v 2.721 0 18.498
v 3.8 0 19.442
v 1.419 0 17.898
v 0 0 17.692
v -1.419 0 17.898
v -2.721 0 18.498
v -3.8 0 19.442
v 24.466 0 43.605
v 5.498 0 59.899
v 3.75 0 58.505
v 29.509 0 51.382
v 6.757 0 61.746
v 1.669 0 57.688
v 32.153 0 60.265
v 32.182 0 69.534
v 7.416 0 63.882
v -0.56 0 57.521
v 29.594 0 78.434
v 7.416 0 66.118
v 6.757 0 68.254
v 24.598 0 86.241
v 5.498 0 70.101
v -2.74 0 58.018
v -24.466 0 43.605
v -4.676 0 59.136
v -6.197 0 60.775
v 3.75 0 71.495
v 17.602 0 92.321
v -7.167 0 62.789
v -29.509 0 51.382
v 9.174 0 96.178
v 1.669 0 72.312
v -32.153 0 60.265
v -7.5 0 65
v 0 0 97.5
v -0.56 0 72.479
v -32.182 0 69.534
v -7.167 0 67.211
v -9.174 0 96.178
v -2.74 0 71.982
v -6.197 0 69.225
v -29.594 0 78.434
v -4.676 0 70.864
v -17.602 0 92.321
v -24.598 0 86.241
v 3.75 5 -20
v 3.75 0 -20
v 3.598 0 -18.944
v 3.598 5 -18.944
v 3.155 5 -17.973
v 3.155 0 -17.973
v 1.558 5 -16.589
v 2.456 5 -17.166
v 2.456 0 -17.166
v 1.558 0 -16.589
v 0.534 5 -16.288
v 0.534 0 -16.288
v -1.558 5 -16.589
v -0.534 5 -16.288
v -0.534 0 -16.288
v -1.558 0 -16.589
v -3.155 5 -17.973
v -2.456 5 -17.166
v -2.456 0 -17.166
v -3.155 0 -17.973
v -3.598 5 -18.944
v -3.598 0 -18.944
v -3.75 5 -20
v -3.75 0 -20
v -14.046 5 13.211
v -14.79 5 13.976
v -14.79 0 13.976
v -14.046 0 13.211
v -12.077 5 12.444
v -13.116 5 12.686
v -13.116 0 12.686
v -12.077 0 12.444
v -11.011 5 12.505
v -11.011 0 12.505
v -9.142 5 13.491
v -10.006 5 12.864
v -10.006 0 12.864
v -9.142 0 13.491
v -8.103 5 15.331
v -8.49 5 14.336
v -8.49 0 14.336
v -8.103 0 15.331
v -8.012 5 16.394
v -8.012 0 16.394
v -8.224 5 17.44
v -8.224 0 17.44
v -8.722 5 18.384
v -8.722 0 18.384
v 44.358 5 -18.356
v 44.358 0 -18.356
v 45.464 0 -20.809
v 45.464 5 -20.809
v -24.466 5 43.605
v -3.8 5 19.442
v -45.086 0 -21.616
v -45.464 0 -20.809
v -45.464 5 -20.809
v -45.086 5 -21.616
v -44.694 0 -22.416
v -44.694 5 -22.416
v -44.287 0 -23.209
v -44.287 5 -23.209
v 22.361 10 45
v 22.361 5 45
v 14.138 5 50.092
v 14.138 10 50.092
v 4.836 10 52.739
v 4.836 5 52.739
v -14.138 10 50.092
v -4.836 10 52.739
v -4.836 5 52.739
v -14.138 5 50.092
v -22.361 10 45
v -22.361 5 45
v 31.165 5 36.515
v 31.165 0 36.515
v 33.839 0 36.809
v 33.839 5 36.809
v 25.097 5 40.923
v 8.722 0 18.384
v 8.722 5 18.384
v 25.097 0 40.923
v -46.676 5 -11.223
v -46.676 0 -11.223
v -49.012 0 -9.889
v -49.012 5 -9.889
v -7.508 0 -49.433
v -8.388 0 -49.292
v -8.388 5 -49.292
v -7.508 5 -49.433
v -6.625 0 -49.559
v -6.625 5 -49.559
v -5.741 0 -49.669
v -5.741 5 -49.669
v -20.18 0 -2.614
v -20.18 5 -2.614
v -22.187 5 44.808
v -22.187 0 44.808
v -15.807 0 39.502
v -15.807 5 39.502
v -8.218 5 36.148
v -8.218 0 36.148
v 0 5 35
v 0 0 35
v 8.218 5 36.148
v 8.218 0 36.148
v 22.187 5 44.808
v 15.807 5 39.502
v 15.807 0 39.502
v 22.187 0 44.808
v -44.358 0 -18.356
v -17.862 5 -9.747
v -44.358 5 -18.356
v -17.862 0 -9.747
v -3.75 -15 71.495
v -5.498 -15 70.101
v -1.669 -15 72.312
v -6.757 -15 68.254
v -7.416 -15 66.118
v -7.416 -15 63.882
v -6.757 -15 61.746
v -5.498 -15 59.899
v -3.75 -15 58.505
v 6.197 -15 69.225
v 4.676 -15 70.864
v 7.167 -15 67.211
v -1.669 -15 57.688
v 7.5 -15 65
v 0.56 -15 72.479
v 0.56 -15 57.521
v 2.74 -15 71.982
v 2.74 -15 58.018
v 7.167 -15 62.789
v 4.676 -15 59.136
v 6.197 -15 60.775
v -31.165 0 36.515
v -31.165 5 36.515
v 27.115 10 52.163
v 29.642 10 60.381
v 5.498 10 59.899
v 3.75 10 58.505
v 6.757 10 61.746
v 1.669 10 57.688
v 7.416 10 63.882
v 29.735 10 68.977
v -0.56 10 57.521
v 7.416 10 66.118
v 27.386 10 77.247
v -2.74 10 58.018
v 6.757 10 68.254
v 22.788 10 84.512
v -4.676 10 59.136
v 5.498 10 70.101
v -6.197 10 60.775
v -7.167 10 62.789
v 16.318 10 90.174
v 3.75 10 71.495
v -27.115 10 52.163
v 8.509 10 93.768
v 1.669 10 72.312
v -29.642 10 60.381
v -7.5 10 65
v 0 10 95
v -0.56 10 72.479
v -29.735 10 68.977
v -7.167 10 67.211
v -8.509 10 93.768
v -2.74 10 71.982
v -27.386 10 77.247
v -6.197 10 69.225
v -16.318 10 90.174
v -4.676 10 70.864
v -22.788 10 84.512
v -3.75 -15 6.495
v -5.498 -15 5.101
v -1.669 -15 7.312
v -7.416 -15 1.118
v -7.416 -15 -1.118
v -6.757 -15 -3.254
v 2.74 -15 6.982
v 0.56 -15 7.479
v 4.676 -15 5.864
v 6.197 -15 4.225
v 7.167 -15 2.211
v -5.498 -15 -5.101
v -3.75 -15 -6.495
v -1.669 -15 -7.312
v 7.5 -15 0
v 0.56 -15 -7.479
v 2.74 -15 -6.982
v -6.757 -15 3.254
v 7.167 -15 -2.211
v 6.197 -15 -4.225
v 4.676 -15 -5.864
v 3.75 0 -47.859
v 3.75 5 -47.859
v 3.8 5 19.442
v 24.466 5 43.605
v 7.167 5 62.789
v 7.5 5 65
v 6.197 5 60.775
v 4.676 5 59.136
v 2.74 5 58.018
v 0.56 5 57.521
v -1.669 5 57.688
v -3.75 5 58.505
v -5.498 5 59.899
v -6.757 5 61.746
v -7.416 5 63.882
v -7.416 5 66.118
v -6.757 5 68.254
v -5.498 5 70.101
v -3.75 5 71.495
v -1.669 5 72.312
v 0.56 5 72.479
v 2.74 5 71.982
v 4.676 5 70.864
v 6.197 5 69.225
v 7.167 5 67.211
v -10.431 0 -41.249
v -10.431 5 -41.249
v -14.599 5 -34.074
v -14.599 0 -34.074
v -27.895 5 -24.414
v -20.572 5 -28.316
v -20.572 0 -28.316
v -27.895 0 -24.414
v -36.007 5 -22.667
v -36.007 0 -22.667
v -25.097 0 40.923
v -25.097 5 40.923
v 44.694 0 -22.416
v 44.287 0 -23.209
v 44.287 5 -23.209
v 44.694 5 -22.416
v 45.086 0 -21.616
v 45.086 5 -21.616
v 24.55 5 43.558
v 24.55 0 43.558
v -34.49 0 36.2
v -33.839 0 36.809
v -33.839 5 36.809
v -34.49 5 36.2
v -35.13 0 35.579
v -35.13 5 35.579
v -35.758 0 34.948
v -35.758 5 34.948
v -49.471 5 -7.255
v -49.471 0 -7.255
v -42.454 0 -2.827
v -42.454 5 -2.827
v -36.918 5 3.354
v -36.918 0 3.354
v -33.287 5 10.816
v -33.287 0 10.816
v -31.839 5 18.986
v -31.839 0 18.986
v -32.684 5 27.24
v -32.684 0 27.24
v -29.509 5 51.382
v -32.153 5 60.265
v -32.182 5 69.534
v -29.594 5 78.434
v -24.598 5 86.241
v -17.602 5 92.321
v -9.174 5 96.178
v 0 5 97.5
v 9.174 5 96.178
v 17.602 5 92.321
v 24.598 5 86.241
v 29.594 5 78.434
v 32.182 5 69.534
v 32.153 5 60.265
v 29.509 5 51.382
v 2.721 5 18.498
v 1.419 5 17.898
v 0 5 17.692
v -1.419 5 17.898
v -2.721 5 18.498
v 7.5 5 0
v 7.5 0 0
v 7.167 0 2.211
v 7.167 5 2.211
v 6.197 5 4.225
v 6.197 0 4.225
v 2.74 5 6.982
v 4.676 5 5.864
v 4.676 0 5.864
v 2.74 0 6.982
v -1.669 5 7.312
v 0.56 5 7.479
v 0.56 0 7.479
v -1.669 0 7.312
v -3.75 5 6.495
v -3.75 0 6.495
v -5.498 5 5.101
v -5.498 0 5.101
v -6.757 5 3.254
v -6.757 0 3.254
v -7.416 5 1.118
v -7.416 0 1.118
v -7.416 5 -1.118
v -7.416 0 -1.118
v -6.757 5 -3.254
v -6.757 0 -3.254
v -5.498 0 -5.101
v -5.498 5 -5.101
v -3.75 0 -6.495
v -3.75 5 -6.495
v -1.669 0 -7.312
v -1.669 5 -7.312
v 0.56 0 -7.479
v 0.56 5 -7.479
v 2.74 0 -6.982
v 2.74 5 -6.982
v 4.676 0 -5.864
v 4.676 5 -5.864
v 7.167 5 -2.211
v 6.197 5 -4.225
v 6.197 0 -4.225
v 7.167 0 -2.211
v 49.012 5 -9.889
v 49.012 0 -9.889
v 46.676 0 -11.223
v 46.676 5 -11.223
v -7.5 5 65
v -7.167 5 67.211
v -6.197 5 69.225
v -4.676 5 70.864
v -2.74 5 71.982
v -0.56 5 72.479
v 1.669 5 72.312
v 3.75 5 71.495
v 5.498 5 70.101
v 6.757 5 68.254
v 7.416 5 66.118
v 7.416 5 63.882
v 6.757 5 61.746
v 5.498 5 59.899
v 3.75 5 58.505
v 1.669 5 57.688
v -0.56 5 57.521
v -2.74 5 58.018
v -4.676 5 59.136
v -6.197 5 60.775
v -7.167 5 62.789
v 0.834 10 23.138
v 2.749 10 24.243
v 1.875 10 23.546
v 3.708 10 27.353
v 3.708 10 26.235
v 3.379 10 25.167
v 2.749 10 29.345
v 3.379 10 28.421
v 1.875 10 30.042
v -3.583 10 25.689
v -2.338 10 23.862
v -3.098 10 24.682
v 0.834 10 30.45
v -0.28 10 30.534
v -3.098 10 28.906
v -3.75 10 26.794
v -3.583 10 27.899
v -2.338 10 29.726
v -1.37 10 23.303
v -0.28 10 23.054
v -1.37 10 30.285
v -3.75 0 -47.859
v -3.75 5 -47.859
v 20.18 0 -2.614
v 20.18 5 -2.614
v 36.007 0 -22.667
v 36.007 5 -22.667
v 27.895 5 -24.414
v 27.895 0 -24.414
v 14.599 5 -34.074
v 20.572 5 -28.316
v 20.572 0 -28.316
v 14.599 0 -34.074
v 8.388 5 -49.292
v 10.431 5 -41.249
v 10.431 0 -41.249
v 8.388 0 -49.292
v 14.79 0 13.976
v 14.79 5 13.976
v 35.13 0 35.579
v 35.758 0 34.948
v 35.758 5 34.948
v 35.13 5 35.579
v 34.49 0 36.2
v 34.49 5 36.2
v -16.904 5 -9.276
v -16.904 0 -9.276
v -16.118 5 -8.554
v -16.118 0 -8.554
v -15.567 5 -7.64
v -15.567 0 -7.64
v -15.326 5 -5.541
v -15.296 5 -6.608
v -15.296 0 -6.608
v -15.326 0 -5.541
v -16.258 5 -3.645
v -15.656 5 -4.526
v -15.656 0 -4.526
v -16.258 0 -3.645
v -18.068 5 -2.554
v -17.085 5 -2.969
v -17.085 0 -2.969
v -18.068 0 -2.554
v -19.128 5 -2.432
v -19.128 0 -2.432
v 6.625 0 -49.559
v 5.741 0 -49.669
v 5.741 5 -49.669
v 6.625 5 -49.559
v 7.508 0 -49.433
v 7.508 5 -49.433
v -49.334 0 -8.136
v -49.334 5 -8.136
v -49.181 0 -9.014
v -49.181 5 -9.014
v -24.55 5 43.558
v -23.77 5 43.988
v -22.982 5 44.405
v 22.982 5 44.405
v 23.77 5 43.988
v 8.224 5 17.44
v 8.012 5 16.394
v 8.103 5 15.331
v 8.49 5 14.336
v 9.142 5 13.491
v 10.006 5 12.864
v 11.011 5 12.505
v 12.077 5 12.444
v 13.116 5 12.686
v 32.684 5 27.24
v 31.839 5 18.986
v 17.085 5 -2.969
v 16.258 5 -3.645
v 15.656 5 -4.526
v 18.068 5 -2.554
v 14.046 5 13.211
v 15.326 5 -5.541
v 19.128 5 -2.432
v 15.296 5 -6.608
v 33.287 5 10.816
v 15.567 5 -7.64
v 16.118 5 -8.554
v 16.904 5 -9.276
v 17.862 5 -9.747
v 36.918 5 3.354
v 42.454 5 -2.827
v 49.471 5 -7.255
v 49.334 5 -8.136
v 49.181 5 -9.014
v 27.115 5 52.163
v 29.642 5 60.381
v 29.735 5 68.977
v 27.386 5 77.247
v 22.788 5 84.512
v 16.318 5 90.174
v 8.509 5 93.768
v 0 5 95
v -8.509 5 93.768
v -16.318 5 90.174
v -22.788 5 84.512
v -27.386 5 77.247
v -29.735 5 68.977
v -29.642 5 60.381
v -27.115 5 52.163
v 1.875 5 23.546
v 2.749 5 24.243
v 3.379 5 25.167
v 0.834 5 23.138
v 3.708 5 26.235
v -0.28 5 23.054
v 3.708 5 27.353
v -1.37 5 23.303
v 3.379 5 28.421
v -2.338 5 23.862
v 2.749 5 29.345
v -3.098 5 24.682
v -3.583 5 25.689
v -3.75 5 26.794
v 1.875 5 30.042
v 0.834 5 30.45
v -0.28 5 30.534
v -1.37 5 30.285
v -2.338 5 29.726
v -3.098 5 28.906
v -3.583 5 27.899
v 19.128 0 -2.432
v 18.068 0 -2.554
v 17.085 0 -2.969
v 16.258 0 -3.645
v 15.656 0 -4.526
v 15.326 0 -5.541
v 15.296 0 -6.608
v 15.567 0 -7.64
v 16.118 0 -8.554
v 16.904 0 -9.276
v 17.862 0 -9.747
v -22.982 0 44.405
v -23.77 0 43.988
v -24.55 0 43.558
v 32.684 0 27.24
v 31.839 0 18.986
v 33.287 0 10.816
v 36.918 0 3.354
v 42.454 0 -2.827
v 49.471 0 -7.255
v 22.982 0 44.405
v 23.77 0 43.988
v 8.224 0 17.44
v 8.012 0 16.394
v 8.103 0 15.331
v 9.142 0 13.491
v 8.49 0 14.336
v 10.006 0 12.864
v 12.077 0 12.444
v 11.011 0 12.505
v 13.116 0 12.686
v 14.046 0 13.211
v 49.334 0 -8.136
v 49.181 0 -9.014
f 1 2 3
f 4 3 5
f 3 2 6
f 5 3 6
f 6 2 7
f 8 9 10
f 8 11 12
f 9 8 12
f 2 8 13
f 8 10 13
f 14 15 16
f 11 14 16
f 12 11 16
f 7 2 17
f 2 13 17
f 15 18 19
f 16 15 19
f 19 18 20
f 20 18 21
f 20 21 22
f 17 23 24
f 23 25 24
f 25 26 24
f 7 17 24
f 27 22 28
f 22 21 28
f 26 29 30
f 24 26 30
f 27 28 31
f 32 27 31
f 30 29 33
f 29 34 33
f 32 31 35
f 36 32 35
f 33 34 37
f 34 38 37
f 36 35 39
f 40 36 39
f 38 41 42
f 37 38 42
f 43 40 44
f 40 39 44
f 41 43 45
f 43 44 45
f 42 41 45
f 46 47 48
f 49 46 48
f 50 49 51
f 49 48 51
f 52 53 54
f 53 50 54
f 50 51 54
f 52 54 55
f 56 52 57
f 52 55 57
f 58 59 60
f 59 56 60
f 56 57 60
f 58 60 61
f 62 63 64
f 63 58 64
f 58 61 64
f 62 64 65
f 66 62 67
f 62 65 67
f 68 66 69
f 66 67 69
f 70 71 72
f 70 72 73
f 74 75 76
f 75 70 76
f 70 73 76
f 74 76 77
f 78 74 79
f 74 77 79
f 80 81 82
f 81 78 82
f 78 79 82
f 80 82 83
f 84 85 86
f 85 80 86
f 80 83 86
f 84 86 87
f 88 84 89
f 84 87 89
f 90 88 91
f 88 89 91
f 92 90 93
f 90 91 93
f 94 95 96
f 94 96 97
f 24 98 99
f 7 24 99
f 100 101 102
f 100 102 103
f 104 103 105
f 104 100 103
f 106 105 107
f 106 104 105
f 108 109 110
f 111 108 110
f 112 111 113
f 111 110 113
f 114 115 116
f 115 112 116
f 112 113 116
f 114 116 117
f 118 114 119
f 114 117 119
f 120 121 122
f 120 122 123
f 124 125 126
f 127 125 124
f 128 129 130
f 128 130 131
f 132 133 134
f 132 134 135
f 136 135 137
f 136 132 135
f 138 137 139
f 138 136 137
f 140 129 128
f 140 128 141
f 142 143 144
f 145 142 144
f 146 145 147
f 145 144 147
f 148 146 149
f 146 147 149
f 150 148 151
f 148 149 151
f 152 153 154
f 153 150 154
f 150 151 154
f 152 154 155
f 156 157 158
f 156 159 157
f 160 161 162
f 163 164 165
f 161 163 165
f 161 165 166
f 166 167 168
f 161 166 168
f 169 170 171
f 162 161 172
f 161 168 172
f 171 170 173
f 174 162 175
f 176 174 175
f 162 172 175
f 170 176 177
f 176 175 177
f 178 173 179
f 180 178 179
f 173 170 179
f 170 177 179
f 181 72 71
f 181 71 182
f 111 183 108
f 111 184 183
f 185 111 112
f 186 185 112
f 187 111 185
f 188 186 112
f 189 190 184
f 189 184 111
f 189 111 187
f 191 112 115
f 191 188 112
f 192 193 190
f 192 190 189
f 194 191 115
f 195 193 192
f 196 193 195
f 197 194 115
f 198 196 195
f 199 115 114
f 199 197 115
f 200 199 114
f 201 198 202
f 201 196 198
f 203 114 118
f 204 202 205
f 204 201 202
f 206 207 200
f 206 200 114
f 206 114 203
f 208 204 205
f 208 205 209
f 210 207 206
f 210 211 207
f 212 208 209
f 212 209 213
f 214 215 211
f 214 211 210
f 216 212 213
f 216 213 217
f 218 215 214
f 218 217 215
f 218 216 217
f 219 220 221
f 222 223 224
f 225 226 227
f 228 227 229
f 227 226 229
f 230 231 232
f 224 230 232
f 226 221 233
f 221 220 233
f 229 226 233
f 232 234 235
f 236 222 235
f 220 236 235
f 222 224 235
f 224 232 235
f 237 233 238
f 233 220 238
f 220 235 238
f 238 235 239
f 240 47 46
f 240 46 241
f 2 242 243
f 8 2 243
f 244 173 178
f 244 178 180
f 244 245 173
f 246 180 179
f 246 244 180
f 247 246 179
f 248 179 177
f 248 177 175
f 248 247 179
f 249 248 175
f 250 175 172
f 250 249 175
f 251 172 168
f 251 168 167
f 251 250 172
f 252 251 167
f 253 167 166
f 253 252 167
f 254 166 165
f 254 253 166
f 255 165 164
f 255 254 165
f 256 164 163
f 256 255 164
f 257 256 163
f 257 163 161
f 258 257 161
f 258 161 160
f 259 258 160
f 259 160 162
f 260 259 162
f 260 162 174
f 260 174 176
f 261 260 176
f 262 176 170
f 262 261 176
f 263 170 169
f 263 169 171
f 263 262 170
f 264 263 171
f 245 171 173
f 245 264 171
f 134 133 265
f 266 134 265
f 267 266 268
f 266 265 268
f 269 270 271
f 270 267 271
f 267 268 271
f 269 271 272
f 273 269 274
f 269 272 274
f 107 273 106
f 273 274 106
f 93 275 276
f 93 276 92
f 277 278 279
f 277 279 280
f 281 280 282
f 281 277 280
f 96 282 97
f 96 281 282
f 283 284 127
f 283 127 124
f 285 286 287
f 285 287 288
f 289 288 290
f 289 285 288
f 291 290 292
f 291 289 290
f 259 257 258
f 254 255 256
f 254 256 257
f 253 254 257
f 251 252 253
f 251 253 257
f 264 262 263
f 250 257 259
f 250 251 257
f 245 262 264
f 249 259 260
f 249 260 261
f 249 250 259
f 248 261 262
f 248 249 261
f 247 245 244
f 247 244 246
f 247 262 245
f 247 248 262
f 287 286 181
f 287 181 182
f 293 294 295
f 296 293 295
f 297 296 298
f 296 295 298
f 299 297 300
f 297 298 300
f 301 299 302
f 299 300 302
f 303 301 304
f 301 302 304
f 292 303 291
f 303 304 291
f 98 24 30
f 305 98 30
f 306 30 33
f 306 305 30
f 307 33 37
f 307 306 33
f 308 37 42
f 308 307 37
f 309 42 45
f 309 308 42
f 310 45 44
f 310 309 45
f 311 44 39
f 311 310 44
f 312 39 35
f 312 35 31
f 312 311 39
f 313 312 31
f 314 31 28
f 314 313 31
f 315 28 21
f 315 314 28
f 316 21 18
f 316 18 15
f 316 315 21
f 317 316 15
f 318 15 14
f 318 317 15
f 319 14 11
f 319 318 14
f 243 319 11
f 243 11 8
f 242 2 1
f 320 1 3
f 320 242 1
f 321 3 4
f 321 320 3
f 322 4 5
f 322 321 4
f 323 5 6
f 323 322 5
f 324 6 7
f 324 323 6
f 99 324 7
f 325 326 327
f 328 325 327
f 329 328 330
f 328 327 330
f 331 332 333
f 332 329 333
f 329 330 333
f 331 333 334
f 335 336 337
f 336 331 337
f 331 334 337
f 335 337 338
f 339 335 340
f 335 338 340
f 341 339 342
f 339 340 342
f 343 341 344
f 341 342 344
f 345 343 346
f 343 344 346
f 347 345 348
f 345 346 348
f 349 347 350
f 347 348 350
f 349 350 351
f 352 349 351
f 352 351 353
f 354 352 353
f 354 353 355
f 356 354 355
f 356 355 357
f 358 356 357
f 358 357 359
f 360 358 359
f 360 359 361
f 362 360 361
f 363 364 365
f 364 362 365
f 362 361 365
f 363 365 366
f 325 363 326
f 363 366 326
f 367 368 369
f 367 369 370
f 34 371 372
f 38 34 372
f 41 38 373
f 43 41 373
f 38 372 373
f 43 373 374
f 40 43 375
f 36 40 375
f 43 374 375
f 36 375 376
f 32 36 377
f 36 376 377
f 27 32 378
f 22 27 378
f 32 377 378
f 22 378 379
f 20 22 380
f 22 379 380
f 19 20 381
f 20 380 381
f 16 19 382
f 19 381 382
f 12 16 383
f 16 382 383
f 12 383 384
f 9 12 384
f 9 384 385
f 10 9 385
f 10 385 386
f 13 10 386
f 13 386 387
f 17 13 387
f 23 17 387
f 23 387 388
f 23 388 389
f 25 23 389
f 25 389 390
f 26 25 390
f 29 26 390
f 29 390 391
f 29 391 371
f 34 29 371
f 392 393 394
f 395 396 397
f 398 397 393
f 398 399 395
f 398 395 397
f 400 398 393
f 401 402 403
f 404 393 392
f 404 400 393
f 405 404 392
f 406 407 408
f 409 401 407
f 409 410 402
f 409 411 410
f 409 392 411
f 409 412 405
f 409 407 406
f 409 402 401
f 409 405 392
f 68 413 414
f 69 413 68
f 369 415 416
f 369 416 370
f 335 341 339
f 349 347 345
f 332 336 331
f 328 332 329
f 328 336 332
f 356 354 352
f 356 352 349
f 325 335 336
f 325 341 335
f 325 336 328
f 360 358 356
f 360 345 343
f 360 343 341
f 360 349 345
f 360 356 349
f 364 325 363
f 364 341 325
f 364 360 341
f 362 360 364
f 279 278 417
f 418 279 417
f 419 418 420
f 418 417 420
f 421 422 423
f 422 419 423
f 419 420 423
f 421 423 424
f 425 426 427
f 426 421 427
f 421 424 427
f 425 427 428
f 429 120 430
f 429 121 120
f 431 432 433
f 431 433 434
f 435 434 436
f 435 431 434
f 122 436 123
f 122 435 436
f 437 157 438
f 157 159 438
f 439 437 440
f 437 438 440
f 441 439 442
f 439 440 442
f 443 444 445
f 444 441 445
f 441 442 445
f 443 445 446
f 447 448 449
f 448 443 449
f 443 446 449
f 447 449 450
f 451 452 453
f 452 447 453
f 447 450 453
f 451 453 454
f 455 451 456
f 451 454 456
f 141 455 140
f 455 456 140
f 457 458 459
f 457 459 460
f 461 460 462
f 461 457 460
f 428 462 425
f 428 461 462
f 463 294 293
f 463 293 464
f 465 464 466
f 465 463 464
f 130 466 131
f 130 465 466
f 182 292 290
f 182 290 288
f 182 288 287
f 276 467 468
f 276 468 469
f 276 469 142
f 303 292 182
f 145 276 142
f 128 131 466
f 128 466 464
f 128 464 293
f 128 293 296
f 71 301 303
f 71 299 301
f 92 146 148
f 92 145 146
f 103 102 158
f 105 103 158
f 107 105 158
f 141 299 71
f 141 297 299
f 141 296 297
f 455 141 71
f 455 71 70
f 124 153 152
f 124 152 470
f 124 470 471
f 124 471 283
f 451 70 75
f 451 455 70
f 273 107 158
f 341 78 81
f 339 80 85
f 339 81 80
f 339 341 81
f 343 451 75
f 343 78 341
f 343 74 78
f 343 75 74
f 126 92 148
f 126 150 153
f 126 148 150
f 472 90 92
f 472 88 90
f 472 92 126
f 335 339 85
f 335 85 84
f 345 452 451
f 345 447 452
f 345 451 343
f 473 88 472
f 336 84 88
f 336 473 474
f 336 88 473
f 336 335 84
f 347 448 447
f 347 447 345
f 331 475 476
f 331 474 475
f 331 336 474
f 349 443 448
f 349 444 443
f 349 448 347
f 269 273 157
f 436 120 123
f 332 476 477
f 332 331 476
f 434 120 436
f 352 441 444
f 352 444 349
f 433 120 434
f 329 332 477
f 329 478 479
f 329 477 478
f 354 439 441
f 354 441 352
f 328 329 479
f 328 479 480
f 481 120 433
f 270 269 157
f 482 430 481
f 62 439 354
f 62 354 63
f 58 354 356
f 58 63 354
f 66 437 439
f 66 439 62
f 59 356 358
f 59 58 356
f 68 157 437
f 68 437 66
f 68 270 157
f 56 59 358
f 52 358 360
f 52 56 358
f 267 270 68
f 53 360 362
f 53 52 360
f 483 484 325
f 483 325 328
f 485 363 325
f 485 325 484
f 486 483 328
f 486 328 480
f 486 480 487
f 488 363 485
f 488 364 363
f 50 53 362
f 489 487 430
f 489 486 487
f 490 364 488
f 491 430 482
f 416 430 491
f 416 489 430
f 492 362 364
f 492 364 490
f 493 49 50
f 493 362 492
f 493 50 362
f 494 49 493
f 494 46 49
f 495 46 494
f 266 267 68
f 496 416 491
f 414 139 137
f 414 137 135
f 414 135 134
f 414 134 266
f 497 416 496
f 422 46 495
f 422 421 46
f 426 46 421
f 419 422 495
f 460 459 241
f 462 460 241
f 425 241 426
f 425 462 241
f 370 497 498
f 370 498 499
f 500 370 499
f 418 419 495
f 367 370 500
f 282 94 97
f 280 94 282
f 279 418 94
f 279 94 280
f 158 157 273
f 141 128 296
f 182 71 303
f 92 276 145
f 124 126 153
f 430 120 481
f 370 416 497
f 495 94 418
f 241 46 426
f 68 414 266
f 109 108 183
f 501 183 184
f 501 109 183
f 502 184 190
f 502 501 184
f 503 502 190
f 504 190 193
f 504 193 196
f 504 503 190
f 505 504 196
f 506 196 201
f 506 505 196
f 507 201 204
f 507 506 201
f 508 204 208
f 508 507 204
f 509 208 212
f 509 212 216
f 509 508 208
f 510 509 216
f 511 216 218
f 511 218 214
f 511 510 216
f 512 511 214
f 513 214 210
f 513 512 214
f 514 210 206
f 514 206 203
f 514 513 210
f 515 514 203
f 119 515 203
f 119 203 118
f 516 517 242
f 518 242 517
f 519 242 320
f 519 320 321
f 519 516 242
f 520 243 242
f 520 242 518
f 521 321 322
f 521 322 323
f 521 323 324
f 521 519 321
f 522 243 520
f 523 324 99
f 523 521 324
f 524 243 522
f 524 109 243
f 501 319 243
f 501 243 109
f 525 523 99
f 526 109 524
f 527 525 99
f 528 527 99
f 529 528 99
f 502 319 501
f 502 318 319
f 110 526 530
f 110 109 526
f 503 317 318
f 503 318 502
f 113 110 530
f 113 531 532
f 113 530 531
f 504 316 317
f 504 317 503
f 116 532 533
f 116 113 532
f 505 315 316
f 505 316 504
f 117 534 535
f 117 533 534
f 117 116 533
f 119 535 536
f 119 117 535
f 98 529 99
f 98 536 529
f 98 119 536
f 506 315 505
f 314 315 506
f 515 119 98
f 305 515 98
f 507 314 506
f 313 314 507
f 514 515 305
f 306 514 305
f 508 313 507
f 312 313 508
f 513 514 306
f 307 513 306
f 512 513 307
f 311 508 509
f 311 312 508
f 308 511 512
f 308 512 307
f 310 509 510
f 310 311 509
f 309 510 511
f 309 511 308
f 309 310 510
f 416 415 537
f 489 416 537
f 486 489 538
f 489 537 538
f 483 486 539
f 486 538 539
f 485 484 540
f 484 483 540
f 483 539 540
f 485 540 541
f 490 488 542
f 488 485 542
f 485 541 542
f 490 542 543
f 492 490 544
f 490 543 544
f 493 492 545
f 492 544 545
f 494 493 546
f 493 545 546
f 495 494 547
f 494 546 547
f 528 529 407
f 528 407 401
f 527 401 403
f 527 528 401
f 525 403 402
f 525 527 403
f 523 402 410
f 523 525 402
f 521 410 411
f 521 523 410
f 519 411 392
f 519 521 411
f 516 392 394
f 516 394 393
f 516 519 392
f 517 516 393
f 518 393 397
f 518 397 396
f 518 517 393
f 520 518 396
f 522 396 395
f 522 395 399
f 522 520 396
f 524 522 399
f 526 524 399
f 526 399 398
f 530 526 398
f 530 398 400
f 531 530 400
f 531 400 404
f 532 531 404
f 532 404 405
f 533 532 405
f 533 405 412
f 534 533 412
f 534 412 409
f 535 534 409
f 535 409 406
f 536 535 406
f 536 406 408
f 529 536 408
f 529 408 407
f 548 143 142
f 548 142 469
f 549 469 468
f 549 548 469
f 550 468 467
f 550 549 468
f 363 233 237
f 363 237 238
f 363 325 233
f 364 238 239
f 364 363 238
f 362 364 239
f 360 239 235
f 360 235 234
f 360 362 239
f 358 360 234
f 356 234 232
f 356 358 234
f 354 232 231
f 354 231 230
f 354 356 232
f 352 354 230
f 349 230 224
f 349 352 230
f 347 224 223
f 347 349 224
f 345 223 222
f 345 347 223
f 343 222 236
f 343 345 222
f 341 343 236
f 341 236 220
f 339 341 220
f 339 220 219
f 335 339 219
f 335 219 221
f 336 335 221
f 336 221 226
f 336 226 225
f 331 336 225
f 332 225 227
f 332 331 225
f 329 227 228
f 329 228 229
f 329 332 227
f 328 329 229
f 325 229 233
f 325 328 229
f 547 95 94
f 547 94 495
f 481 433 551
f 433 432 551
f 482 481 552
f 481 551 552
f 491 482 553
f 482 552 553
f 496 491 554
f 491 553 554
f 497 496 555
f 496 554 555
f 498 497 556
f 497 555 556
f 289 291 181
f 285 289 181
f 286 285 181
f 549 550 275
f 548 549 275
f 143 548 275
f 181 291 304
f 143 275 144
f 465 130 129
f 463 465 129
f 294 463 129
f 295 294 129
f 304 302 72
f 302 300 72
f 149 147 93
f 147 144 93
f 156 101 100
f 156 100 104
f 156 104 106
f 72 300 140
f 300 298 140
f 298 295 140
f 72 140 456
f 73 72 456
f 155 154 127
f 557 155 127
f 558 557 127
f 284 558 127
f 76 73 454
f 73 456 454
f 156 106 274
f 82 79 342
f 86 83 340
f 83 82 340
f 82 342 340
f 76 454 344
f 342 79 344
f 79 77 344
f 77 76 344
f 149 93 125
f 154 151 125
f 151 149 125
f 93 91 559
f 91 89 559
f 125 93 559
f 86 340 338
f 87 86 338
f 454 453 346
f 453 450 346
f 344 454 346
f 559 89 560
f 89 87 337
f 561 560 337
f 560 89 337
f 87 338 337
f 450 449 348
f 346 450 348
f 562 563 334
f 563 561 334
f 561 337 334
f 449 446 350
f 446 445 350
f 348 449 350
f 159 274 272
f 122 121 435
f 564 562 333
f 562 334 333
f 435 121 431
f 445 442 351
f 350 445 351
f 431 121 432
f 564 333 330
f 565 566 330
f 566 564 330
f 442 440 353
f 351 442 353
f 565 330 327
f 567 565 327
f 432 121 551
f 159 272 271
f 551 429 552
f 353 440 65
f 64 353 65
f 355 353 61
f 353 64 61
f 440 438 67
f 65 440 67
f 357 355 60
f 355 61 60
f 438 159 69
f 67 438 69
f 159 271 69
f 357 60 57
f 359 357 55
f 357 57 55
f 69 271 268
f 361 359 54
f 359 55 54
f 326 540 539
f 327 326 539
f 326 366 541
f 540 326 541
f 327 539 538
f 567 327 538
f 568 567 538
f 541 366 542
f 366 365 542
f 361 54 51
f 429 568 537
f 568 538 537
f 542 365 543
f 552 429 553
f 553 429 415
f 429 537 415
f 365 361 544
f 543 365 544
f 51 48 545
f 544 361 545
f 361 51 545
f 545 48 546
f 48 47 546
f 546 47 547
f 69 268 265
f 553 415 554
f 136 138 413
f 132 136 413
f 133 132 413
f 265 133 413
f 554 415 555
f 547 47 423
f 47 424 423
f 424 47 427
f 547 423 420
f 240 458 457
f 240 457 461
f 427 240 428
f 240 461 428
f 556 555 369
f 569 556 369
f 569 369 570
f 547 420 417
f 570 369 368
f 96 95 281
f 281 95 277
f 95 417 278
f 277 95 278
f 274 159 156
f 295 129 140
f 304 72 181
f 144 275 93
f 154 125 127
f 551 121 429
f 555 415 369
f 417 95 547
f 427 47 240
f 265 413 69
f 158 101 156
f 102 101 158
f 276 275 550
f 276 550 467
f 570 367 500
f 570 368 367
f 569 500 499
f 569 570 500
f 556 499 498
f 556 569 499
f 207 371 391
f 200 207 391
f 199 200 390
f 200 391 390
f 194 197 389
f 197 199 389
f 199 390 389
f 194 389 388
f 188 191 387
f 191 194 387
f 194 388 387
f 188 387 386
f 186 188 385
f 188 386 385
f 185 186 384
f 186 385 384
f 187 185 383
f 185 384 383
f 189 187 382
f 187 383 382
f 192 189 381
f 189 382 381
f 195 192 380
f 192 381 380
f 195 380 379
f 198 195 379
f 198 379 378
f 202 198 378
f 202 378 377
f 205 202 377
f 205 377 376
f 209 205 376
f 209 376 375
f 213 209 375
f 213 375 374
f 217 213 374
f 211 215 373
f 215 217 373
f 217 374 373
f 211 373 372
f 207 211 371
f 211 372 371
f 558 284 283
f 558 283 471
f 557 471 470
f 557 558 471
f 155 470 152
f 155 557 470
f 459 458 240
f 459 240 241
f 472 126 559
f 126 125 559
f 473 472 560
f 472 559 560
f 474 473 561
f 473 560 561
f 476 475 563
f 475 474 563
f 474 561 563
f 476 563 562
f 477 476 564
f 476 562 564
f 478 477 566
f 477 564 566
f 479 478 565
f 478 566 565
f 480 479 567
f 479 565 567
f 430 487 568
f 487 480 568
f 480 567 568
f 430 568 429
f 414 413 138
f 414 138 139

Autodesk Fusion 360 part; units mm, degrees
sketch "Sketch1" plane through (0, 0, 0) normal (0, 1, 0) x (1, 0, 0) in component "follower"
  line L0 (0, 0) -> (29.3893, -40.4508) construction
  line L1 (0, 0) -> (50, 0) construction
  line L2 (0, 0) -> (-29.3893, -40.4508) construction
  line L3 (0, 0) -> (50, 0) construction
  line L4 (8.7219, -18.3845) -> (26.3554, -42.655)
  line L5 (32.4231, -38.2467) -> (14.7895, -13.9761)
  arc A0 (14.7895, -13.9761) -> (8.7219, -18.3845) centre (11.7557, -16.1803) ccw
  line L6 (11.7557, -16.1803) -> (29.3893, -40.4508) construction
  line L7 (20.1799, 2.6139) -> (48.7116, 11.8844)
  arc A1 (17.8623, 9.7468) -> (20.1799, 2.6139) centre (19.0211, 6.1803) ccw
  line L8 (46.394, 19.0173) -> (17.8623, 9.7468)
  line L9 (3.75, 20) -> (3.75, 50)
  arc A2 (-3.75, 20) -> (3.75, 20) centre (0, 20) ccw
  line L10 (-3.75, 50) -> (-3.75, 20)
  line L11 (-17.8623, 9.7468) -> (-46.394, 19.0173)
  arc A3 (-20.1799, 2.6139) -> (-17.8623, 9.7468) centre (-19.0211, 6.1803) ccw
  line L12 (-48.7116, 11.8844) -> (-20.1799, 2.6139)
  line L13 (-14.7895, -13.9761) -> (-32.4231, -38.2467)
  arc A4 (-8.7219, -18.3845) -> (-14.7895, -13.9761) centre (-11.7557, -16.1803) ccw
  line L14 (-26.3554, -42.655) -> (-8.7219, -18.3845)
  circle A5 centre (0, 0) radius 7.5
  arc A6 (-31.5791, -43.4951) -> (-18.1729, -31.3928) centre (0, -65) ccw construction
  arc A7 (22.1872, -44.8077) -> (-22.1872, -44.8077) centre (0, -65) ccw
  arc A8 (-26.2727, -42.5411) -> (-22.1872, -44.8077) centre (0, 0) ccw
  arc A9 (22.1872, -44.8077) -> (26.2727, -42.5411) centre (0, 0) ccw
  arc A10 (29.3183, -40.5023) -> (29.3893, -40.4508) centre (0, 0) ccw
  arc A11 (49.4709, 7.2549) -> (35.7584, -34.9476) centre (61.8187, -20.0861) ccw
  arc A12 (8.3875, 49.2915) -> (44.2871, 23.2089) centre (38.206, 52.5861) ccw
  arc A13 (-44.2871, 23.2089) -> (-8.3875, 49.2915) centre (-38.206, 52.5861) ccw
  arc A14 (-35.7584, -34.9476) -> (-49.4709, 7.2549) centre (-61.8187, -20.0861) ccw
  arc A15 (-48.5777, 11.8409) -> (-49.4709, 7.2549) centre (0, 0) ccw
  arc A16 (-35.7584, -34.9476) -> (-32.3403, -38.1327) centre (0, 0) ccw
  arc A17 (32.3403, -38.1327) -> (35.7584, -34.9476) centre (0, 0) ccw
  arc A18 (49.4709, 7.2549) -> (48.5777, 11.8409) centre (0, 0) ccw
  arc A19 (46.2601, 18.9738) -> (44.2871, 23.2089) centre (0, 0) ccw
  arc A20 (8.3875, 49.2915) -> (3.75, 49.8592) centre (0, 0) ccw
  arc A21 (-3.75, 49.8592) -> (-8.3875, 49.2915) centre (0, 0) ccw
  arc A22 (-44.2871, 23.2089) -> (-46.2601, 18.9738) centre (0, 0) ccw
  dimension "d1" = 100
  dimension "d2" = 50
  dimension "d3" = 54
  dimension "d4" = 126
  dimension "d5" = 65
  dimension "d6" = 60
  dimension "d8" = 20
  dimension "d11" = 15
  dimension "d13" = 360
extrude "Extrude1" add sketch "Sketch1" along normal blind 5 makes body 1 in component "follower"
chamfer "Chamfer1" distance 2 angle 45 10 edges at (26.2727, 2.5, 42.5411) (32.3403, 2.5, 38.1327) (48.5777, 2.5, -11.8409) (46.2601, 2.5, -18.9738) (3.75, 2.5, -49.8592) (-3.75, 2.5, -49.8592) (-46.2601, 2.5, -18.9738) (-48.5777, 2.5, -11.8409) (-32.3403, 2.5, 38.1327) (-26.2727, 2.5, 42.5411) on bodies 1 in component "follower"
sketch "Sketch1 (2)" plane through (0, 5, 0) normal (0, 1, 0) x (-1, 0, 0) in component "cam"
  line L0 (25.0971, 40.9231) -> (24.5504, 43.5578)
  arc A0 (24.5504, 43.5578) -> (22.1872, 44.8077) centre (0, 0) ccw
  arc A1 (-22.1872, 44.8077) -> (22.1872, 44.8077) centre (0, 65) ccw
  arc A2 (-22.1872, 44.8077) -> (-24.5504, 43.5578) centre (0, 0) ccw
  line L1 (-24.5504, 43.5578) -> (-25.0971, 40.9231)
  line L2 (-25.0971, 40.9231) -> (-8.7219, 18.3845)
  arc A3 (-14.7895, 13.9761) -> (-8.7219, 18.3845) centre (-11.7557, 16.1803) ccw
  line L3 (-14.7895, 13.9761) -> (-31.1647, 36.5147)
  line L4 (-31.1647, 36.5147) -> (-33.8394, 36.8089)
  arc A4 (-33.8394, 36.8089) -> (-35.7584, 34.9476) centre (0, 0) ccw
  arc A5 (-49.4709, -7.2549) -> (-35.7584, 34.9476) centre (-61.8187, 20.0861) ccw
  arc A6 (-49.4709, -7.2549) -> (-49.0124, -9.8887) centre (0, 0) ccw
  line L5 (-49.0124, -9.8887) -> (-46.6756, -11.2228)
  line L6 (-46.6756, -11.2228) -> (-20.1799, -2.6139)
  arc A7 (-17.8623, -9.7468) -> (-20.1799, -2.6139) centre (-19.0211, -6.1803) ccw
  line L7 (-17.8623, -9.7468) -> (-44.358, -18.3558)
  line L8 (-44.358, -18.3558) -> (-45.4643, -20.8086)
  arc A8 (-45.4643, -20.8086) -> (-44.2871, -23.2089) centre (0, 0) ccw
  arc A9 (-8.3875, -49.2915) -> (-44.2871, -23.2089) centre (-38.206, -52.5861) ccw
  arc A10 (-8.3875, -49.2915) -> (-5.741, -49.6693) centre (0, 0) ccw
  line L9 (-5.741, -49.6693) -> (-3.75, -47.8592)
  line L10 (-3.75, -47.8592) -> (-3.75, -20)
  arc A11 (3.75, -20) -> (-3.75, -20) centre (0, -20) ccw
  line L11 (3.75, -20) -> (3.75, -47.8592)
  line L12 (3.75, -47.8592) -> (5.741, -49.6693)
  arc A12 (5.741, -49.6693) -> (8.3875, -49.2915) centre (0, 0) ccw
  arc A13 (44.2871, -23.2089) -> (8.3875, -49.2915) centre (38.206, -52.5861) ccw
  arc A14 (44.2871, -23.2089) -> (45.4643, -20.8086) centre (0, 0) ccw
  line L13 (45.4643, -20.8086) -> (44.358, -18.3558)
  line L14 (44.358, -18.3558) -> (17.8623, -9.7468)
  arc A15 (20.1799, -2.6139) -> (17.8623, -9.7468) centre (19.0211, -6.1803) ccw
  line L15 (20.1799, -2.6139) -> (46.6756, -11.2228)
  line L16 (46.6756, -11.2228) -> (49.0124, -9.8887)
  arc A16 (49.0124, -9.8887) -> (49.4709, -7.2549) centre (0, 0) ccw
  arc A17 (35.7584, 34.9476) -> (49.4709, -7.2549) centre (61.8187, 20.0861) ccw
  arc A18 (35.7584, 34.9476) -> (33.8394, 36.8089) centre (0, 0) ccw
  line L17 (33.8394, 36.8089) -> (31.1647, 36.5147)
  line L18 (31.1647, 36.5147) -> (14.7895, 13.9761)
  arc A19 (8.7219, 18.3845) -> (14.7895, 13.9761) centre (11.7557, 16.1803) ccw
  line L19 (8.7219, 18.3845) -> (25.0971, 40.9231)
  circle A20 centre (0, 0) radius 7.5
  arc A21 (31.5791, 43.4951) -> (18.1729, 31.3928) centre (0, 65) ccw
  circle A22 centre (0, 65) radius 30
  circle A23 centre (0, 65) radius 32.5
  circle A24 centre (0, 65) radius 7.5
  line L20 (0, 0) -> (0, 35)
  circle A25 centre (0, 26.794) radius 3.75
  line L21 (24.6979, 43.875) -> (3.7997, 19.4423)
  line L22 (-3.7997, 19.4423) -> (-24.6979, 43.875)
  arc A26 (-3.7997, 19.4423) -> (3.7997, 19.4423) centre (0, 22.6923) ccw
  arc A27 (22.3607, 45) -> (-22.3607, 45) centre (0, 18.0742) ccw
  point P0 (0, 15)
  dimension "d17" = 60
  dimension "d18" = 65
  dimension "d19" = 15
  dimension "d20" = 7.5
  dimension "d21" = 15
  dimension "d22" = 5
  dimension "d23" = 20
  dimension "d24" = 35
extrude "Extrude1'" add sketch "Sketch1 (2)" against normal blind 5 separate body contours A0 A1 A22 A23 L20 | A21 A23 L20 A25 L21 | A0 A2 A22 A23 L21 L22 | A21 L20 A25 L21 A26 | A1 A22 A27 | A21 A23 L20 A25 L22 | A1 A2 A22 A23 L20 | A21 L20 A25 | A21 L20 A25 | A22 A27 | A21 L20 A25 | A21 L20 A25 | A21 L20 A25 L22 A26 makes body 2 in component "cam"
extrude "Extrude2" add sketch "Sketch1 (2)" along normal blind 5 contours A21 L20 A25 | A21 L20 A25 | A22 A27 | A21 L20 A25 | A21 L20 A25 bodies 2 in component "cam"
cylinder "CylinderPrimitive1" add diameter 15 height -20 placed x (1, 0, 0) y (0, 0, -1) z (0, 1, 0) at (0, 5, 0) separate body makes body 3 in component "shaft"
sketch "Sketch1 (3)" plane through (0, 0, 0) normal (0, 1, 0) x (1, 0, 0) in component "Component"
  circle A0 centre (0, -65) radius 7.5
  circle A1 centre (0, -65) radius 7.5
  arc A2 (-22.3607, -45) -> (22.3607, -45) centre (0, -65) ccw
  arc A3 (-22.3607, -45) -> (22.3607, -45) centre (0, -18.0742) ccw
  dimension "d33" = 15
extrude "Extrude1''" add sketch "Sketch1 (3)" along normal blind -15 and the other way blind -5 separate body contours A0 A1 makes body 4 in component "Component"
component "cam" placed x (1, 0, 0) y (0, 1, 0) z (0, 0, 1) at (0, 0, 0)
component "shaft" placed x (1, 0, 0) y (0, 1, 0) z (0, 0, 1) at (0, 0, 0)
component "follower" placed x (1, 0, 0) y (0, 1, 0) z (0, 0, 1) at (0, 0, 0)
component "Component" placed x (1, 0, 0) y (0, 1, 0) z (0, 0, 1) at (0, 0, 0)
equation "d4 = 180 deg - 54 deg"
